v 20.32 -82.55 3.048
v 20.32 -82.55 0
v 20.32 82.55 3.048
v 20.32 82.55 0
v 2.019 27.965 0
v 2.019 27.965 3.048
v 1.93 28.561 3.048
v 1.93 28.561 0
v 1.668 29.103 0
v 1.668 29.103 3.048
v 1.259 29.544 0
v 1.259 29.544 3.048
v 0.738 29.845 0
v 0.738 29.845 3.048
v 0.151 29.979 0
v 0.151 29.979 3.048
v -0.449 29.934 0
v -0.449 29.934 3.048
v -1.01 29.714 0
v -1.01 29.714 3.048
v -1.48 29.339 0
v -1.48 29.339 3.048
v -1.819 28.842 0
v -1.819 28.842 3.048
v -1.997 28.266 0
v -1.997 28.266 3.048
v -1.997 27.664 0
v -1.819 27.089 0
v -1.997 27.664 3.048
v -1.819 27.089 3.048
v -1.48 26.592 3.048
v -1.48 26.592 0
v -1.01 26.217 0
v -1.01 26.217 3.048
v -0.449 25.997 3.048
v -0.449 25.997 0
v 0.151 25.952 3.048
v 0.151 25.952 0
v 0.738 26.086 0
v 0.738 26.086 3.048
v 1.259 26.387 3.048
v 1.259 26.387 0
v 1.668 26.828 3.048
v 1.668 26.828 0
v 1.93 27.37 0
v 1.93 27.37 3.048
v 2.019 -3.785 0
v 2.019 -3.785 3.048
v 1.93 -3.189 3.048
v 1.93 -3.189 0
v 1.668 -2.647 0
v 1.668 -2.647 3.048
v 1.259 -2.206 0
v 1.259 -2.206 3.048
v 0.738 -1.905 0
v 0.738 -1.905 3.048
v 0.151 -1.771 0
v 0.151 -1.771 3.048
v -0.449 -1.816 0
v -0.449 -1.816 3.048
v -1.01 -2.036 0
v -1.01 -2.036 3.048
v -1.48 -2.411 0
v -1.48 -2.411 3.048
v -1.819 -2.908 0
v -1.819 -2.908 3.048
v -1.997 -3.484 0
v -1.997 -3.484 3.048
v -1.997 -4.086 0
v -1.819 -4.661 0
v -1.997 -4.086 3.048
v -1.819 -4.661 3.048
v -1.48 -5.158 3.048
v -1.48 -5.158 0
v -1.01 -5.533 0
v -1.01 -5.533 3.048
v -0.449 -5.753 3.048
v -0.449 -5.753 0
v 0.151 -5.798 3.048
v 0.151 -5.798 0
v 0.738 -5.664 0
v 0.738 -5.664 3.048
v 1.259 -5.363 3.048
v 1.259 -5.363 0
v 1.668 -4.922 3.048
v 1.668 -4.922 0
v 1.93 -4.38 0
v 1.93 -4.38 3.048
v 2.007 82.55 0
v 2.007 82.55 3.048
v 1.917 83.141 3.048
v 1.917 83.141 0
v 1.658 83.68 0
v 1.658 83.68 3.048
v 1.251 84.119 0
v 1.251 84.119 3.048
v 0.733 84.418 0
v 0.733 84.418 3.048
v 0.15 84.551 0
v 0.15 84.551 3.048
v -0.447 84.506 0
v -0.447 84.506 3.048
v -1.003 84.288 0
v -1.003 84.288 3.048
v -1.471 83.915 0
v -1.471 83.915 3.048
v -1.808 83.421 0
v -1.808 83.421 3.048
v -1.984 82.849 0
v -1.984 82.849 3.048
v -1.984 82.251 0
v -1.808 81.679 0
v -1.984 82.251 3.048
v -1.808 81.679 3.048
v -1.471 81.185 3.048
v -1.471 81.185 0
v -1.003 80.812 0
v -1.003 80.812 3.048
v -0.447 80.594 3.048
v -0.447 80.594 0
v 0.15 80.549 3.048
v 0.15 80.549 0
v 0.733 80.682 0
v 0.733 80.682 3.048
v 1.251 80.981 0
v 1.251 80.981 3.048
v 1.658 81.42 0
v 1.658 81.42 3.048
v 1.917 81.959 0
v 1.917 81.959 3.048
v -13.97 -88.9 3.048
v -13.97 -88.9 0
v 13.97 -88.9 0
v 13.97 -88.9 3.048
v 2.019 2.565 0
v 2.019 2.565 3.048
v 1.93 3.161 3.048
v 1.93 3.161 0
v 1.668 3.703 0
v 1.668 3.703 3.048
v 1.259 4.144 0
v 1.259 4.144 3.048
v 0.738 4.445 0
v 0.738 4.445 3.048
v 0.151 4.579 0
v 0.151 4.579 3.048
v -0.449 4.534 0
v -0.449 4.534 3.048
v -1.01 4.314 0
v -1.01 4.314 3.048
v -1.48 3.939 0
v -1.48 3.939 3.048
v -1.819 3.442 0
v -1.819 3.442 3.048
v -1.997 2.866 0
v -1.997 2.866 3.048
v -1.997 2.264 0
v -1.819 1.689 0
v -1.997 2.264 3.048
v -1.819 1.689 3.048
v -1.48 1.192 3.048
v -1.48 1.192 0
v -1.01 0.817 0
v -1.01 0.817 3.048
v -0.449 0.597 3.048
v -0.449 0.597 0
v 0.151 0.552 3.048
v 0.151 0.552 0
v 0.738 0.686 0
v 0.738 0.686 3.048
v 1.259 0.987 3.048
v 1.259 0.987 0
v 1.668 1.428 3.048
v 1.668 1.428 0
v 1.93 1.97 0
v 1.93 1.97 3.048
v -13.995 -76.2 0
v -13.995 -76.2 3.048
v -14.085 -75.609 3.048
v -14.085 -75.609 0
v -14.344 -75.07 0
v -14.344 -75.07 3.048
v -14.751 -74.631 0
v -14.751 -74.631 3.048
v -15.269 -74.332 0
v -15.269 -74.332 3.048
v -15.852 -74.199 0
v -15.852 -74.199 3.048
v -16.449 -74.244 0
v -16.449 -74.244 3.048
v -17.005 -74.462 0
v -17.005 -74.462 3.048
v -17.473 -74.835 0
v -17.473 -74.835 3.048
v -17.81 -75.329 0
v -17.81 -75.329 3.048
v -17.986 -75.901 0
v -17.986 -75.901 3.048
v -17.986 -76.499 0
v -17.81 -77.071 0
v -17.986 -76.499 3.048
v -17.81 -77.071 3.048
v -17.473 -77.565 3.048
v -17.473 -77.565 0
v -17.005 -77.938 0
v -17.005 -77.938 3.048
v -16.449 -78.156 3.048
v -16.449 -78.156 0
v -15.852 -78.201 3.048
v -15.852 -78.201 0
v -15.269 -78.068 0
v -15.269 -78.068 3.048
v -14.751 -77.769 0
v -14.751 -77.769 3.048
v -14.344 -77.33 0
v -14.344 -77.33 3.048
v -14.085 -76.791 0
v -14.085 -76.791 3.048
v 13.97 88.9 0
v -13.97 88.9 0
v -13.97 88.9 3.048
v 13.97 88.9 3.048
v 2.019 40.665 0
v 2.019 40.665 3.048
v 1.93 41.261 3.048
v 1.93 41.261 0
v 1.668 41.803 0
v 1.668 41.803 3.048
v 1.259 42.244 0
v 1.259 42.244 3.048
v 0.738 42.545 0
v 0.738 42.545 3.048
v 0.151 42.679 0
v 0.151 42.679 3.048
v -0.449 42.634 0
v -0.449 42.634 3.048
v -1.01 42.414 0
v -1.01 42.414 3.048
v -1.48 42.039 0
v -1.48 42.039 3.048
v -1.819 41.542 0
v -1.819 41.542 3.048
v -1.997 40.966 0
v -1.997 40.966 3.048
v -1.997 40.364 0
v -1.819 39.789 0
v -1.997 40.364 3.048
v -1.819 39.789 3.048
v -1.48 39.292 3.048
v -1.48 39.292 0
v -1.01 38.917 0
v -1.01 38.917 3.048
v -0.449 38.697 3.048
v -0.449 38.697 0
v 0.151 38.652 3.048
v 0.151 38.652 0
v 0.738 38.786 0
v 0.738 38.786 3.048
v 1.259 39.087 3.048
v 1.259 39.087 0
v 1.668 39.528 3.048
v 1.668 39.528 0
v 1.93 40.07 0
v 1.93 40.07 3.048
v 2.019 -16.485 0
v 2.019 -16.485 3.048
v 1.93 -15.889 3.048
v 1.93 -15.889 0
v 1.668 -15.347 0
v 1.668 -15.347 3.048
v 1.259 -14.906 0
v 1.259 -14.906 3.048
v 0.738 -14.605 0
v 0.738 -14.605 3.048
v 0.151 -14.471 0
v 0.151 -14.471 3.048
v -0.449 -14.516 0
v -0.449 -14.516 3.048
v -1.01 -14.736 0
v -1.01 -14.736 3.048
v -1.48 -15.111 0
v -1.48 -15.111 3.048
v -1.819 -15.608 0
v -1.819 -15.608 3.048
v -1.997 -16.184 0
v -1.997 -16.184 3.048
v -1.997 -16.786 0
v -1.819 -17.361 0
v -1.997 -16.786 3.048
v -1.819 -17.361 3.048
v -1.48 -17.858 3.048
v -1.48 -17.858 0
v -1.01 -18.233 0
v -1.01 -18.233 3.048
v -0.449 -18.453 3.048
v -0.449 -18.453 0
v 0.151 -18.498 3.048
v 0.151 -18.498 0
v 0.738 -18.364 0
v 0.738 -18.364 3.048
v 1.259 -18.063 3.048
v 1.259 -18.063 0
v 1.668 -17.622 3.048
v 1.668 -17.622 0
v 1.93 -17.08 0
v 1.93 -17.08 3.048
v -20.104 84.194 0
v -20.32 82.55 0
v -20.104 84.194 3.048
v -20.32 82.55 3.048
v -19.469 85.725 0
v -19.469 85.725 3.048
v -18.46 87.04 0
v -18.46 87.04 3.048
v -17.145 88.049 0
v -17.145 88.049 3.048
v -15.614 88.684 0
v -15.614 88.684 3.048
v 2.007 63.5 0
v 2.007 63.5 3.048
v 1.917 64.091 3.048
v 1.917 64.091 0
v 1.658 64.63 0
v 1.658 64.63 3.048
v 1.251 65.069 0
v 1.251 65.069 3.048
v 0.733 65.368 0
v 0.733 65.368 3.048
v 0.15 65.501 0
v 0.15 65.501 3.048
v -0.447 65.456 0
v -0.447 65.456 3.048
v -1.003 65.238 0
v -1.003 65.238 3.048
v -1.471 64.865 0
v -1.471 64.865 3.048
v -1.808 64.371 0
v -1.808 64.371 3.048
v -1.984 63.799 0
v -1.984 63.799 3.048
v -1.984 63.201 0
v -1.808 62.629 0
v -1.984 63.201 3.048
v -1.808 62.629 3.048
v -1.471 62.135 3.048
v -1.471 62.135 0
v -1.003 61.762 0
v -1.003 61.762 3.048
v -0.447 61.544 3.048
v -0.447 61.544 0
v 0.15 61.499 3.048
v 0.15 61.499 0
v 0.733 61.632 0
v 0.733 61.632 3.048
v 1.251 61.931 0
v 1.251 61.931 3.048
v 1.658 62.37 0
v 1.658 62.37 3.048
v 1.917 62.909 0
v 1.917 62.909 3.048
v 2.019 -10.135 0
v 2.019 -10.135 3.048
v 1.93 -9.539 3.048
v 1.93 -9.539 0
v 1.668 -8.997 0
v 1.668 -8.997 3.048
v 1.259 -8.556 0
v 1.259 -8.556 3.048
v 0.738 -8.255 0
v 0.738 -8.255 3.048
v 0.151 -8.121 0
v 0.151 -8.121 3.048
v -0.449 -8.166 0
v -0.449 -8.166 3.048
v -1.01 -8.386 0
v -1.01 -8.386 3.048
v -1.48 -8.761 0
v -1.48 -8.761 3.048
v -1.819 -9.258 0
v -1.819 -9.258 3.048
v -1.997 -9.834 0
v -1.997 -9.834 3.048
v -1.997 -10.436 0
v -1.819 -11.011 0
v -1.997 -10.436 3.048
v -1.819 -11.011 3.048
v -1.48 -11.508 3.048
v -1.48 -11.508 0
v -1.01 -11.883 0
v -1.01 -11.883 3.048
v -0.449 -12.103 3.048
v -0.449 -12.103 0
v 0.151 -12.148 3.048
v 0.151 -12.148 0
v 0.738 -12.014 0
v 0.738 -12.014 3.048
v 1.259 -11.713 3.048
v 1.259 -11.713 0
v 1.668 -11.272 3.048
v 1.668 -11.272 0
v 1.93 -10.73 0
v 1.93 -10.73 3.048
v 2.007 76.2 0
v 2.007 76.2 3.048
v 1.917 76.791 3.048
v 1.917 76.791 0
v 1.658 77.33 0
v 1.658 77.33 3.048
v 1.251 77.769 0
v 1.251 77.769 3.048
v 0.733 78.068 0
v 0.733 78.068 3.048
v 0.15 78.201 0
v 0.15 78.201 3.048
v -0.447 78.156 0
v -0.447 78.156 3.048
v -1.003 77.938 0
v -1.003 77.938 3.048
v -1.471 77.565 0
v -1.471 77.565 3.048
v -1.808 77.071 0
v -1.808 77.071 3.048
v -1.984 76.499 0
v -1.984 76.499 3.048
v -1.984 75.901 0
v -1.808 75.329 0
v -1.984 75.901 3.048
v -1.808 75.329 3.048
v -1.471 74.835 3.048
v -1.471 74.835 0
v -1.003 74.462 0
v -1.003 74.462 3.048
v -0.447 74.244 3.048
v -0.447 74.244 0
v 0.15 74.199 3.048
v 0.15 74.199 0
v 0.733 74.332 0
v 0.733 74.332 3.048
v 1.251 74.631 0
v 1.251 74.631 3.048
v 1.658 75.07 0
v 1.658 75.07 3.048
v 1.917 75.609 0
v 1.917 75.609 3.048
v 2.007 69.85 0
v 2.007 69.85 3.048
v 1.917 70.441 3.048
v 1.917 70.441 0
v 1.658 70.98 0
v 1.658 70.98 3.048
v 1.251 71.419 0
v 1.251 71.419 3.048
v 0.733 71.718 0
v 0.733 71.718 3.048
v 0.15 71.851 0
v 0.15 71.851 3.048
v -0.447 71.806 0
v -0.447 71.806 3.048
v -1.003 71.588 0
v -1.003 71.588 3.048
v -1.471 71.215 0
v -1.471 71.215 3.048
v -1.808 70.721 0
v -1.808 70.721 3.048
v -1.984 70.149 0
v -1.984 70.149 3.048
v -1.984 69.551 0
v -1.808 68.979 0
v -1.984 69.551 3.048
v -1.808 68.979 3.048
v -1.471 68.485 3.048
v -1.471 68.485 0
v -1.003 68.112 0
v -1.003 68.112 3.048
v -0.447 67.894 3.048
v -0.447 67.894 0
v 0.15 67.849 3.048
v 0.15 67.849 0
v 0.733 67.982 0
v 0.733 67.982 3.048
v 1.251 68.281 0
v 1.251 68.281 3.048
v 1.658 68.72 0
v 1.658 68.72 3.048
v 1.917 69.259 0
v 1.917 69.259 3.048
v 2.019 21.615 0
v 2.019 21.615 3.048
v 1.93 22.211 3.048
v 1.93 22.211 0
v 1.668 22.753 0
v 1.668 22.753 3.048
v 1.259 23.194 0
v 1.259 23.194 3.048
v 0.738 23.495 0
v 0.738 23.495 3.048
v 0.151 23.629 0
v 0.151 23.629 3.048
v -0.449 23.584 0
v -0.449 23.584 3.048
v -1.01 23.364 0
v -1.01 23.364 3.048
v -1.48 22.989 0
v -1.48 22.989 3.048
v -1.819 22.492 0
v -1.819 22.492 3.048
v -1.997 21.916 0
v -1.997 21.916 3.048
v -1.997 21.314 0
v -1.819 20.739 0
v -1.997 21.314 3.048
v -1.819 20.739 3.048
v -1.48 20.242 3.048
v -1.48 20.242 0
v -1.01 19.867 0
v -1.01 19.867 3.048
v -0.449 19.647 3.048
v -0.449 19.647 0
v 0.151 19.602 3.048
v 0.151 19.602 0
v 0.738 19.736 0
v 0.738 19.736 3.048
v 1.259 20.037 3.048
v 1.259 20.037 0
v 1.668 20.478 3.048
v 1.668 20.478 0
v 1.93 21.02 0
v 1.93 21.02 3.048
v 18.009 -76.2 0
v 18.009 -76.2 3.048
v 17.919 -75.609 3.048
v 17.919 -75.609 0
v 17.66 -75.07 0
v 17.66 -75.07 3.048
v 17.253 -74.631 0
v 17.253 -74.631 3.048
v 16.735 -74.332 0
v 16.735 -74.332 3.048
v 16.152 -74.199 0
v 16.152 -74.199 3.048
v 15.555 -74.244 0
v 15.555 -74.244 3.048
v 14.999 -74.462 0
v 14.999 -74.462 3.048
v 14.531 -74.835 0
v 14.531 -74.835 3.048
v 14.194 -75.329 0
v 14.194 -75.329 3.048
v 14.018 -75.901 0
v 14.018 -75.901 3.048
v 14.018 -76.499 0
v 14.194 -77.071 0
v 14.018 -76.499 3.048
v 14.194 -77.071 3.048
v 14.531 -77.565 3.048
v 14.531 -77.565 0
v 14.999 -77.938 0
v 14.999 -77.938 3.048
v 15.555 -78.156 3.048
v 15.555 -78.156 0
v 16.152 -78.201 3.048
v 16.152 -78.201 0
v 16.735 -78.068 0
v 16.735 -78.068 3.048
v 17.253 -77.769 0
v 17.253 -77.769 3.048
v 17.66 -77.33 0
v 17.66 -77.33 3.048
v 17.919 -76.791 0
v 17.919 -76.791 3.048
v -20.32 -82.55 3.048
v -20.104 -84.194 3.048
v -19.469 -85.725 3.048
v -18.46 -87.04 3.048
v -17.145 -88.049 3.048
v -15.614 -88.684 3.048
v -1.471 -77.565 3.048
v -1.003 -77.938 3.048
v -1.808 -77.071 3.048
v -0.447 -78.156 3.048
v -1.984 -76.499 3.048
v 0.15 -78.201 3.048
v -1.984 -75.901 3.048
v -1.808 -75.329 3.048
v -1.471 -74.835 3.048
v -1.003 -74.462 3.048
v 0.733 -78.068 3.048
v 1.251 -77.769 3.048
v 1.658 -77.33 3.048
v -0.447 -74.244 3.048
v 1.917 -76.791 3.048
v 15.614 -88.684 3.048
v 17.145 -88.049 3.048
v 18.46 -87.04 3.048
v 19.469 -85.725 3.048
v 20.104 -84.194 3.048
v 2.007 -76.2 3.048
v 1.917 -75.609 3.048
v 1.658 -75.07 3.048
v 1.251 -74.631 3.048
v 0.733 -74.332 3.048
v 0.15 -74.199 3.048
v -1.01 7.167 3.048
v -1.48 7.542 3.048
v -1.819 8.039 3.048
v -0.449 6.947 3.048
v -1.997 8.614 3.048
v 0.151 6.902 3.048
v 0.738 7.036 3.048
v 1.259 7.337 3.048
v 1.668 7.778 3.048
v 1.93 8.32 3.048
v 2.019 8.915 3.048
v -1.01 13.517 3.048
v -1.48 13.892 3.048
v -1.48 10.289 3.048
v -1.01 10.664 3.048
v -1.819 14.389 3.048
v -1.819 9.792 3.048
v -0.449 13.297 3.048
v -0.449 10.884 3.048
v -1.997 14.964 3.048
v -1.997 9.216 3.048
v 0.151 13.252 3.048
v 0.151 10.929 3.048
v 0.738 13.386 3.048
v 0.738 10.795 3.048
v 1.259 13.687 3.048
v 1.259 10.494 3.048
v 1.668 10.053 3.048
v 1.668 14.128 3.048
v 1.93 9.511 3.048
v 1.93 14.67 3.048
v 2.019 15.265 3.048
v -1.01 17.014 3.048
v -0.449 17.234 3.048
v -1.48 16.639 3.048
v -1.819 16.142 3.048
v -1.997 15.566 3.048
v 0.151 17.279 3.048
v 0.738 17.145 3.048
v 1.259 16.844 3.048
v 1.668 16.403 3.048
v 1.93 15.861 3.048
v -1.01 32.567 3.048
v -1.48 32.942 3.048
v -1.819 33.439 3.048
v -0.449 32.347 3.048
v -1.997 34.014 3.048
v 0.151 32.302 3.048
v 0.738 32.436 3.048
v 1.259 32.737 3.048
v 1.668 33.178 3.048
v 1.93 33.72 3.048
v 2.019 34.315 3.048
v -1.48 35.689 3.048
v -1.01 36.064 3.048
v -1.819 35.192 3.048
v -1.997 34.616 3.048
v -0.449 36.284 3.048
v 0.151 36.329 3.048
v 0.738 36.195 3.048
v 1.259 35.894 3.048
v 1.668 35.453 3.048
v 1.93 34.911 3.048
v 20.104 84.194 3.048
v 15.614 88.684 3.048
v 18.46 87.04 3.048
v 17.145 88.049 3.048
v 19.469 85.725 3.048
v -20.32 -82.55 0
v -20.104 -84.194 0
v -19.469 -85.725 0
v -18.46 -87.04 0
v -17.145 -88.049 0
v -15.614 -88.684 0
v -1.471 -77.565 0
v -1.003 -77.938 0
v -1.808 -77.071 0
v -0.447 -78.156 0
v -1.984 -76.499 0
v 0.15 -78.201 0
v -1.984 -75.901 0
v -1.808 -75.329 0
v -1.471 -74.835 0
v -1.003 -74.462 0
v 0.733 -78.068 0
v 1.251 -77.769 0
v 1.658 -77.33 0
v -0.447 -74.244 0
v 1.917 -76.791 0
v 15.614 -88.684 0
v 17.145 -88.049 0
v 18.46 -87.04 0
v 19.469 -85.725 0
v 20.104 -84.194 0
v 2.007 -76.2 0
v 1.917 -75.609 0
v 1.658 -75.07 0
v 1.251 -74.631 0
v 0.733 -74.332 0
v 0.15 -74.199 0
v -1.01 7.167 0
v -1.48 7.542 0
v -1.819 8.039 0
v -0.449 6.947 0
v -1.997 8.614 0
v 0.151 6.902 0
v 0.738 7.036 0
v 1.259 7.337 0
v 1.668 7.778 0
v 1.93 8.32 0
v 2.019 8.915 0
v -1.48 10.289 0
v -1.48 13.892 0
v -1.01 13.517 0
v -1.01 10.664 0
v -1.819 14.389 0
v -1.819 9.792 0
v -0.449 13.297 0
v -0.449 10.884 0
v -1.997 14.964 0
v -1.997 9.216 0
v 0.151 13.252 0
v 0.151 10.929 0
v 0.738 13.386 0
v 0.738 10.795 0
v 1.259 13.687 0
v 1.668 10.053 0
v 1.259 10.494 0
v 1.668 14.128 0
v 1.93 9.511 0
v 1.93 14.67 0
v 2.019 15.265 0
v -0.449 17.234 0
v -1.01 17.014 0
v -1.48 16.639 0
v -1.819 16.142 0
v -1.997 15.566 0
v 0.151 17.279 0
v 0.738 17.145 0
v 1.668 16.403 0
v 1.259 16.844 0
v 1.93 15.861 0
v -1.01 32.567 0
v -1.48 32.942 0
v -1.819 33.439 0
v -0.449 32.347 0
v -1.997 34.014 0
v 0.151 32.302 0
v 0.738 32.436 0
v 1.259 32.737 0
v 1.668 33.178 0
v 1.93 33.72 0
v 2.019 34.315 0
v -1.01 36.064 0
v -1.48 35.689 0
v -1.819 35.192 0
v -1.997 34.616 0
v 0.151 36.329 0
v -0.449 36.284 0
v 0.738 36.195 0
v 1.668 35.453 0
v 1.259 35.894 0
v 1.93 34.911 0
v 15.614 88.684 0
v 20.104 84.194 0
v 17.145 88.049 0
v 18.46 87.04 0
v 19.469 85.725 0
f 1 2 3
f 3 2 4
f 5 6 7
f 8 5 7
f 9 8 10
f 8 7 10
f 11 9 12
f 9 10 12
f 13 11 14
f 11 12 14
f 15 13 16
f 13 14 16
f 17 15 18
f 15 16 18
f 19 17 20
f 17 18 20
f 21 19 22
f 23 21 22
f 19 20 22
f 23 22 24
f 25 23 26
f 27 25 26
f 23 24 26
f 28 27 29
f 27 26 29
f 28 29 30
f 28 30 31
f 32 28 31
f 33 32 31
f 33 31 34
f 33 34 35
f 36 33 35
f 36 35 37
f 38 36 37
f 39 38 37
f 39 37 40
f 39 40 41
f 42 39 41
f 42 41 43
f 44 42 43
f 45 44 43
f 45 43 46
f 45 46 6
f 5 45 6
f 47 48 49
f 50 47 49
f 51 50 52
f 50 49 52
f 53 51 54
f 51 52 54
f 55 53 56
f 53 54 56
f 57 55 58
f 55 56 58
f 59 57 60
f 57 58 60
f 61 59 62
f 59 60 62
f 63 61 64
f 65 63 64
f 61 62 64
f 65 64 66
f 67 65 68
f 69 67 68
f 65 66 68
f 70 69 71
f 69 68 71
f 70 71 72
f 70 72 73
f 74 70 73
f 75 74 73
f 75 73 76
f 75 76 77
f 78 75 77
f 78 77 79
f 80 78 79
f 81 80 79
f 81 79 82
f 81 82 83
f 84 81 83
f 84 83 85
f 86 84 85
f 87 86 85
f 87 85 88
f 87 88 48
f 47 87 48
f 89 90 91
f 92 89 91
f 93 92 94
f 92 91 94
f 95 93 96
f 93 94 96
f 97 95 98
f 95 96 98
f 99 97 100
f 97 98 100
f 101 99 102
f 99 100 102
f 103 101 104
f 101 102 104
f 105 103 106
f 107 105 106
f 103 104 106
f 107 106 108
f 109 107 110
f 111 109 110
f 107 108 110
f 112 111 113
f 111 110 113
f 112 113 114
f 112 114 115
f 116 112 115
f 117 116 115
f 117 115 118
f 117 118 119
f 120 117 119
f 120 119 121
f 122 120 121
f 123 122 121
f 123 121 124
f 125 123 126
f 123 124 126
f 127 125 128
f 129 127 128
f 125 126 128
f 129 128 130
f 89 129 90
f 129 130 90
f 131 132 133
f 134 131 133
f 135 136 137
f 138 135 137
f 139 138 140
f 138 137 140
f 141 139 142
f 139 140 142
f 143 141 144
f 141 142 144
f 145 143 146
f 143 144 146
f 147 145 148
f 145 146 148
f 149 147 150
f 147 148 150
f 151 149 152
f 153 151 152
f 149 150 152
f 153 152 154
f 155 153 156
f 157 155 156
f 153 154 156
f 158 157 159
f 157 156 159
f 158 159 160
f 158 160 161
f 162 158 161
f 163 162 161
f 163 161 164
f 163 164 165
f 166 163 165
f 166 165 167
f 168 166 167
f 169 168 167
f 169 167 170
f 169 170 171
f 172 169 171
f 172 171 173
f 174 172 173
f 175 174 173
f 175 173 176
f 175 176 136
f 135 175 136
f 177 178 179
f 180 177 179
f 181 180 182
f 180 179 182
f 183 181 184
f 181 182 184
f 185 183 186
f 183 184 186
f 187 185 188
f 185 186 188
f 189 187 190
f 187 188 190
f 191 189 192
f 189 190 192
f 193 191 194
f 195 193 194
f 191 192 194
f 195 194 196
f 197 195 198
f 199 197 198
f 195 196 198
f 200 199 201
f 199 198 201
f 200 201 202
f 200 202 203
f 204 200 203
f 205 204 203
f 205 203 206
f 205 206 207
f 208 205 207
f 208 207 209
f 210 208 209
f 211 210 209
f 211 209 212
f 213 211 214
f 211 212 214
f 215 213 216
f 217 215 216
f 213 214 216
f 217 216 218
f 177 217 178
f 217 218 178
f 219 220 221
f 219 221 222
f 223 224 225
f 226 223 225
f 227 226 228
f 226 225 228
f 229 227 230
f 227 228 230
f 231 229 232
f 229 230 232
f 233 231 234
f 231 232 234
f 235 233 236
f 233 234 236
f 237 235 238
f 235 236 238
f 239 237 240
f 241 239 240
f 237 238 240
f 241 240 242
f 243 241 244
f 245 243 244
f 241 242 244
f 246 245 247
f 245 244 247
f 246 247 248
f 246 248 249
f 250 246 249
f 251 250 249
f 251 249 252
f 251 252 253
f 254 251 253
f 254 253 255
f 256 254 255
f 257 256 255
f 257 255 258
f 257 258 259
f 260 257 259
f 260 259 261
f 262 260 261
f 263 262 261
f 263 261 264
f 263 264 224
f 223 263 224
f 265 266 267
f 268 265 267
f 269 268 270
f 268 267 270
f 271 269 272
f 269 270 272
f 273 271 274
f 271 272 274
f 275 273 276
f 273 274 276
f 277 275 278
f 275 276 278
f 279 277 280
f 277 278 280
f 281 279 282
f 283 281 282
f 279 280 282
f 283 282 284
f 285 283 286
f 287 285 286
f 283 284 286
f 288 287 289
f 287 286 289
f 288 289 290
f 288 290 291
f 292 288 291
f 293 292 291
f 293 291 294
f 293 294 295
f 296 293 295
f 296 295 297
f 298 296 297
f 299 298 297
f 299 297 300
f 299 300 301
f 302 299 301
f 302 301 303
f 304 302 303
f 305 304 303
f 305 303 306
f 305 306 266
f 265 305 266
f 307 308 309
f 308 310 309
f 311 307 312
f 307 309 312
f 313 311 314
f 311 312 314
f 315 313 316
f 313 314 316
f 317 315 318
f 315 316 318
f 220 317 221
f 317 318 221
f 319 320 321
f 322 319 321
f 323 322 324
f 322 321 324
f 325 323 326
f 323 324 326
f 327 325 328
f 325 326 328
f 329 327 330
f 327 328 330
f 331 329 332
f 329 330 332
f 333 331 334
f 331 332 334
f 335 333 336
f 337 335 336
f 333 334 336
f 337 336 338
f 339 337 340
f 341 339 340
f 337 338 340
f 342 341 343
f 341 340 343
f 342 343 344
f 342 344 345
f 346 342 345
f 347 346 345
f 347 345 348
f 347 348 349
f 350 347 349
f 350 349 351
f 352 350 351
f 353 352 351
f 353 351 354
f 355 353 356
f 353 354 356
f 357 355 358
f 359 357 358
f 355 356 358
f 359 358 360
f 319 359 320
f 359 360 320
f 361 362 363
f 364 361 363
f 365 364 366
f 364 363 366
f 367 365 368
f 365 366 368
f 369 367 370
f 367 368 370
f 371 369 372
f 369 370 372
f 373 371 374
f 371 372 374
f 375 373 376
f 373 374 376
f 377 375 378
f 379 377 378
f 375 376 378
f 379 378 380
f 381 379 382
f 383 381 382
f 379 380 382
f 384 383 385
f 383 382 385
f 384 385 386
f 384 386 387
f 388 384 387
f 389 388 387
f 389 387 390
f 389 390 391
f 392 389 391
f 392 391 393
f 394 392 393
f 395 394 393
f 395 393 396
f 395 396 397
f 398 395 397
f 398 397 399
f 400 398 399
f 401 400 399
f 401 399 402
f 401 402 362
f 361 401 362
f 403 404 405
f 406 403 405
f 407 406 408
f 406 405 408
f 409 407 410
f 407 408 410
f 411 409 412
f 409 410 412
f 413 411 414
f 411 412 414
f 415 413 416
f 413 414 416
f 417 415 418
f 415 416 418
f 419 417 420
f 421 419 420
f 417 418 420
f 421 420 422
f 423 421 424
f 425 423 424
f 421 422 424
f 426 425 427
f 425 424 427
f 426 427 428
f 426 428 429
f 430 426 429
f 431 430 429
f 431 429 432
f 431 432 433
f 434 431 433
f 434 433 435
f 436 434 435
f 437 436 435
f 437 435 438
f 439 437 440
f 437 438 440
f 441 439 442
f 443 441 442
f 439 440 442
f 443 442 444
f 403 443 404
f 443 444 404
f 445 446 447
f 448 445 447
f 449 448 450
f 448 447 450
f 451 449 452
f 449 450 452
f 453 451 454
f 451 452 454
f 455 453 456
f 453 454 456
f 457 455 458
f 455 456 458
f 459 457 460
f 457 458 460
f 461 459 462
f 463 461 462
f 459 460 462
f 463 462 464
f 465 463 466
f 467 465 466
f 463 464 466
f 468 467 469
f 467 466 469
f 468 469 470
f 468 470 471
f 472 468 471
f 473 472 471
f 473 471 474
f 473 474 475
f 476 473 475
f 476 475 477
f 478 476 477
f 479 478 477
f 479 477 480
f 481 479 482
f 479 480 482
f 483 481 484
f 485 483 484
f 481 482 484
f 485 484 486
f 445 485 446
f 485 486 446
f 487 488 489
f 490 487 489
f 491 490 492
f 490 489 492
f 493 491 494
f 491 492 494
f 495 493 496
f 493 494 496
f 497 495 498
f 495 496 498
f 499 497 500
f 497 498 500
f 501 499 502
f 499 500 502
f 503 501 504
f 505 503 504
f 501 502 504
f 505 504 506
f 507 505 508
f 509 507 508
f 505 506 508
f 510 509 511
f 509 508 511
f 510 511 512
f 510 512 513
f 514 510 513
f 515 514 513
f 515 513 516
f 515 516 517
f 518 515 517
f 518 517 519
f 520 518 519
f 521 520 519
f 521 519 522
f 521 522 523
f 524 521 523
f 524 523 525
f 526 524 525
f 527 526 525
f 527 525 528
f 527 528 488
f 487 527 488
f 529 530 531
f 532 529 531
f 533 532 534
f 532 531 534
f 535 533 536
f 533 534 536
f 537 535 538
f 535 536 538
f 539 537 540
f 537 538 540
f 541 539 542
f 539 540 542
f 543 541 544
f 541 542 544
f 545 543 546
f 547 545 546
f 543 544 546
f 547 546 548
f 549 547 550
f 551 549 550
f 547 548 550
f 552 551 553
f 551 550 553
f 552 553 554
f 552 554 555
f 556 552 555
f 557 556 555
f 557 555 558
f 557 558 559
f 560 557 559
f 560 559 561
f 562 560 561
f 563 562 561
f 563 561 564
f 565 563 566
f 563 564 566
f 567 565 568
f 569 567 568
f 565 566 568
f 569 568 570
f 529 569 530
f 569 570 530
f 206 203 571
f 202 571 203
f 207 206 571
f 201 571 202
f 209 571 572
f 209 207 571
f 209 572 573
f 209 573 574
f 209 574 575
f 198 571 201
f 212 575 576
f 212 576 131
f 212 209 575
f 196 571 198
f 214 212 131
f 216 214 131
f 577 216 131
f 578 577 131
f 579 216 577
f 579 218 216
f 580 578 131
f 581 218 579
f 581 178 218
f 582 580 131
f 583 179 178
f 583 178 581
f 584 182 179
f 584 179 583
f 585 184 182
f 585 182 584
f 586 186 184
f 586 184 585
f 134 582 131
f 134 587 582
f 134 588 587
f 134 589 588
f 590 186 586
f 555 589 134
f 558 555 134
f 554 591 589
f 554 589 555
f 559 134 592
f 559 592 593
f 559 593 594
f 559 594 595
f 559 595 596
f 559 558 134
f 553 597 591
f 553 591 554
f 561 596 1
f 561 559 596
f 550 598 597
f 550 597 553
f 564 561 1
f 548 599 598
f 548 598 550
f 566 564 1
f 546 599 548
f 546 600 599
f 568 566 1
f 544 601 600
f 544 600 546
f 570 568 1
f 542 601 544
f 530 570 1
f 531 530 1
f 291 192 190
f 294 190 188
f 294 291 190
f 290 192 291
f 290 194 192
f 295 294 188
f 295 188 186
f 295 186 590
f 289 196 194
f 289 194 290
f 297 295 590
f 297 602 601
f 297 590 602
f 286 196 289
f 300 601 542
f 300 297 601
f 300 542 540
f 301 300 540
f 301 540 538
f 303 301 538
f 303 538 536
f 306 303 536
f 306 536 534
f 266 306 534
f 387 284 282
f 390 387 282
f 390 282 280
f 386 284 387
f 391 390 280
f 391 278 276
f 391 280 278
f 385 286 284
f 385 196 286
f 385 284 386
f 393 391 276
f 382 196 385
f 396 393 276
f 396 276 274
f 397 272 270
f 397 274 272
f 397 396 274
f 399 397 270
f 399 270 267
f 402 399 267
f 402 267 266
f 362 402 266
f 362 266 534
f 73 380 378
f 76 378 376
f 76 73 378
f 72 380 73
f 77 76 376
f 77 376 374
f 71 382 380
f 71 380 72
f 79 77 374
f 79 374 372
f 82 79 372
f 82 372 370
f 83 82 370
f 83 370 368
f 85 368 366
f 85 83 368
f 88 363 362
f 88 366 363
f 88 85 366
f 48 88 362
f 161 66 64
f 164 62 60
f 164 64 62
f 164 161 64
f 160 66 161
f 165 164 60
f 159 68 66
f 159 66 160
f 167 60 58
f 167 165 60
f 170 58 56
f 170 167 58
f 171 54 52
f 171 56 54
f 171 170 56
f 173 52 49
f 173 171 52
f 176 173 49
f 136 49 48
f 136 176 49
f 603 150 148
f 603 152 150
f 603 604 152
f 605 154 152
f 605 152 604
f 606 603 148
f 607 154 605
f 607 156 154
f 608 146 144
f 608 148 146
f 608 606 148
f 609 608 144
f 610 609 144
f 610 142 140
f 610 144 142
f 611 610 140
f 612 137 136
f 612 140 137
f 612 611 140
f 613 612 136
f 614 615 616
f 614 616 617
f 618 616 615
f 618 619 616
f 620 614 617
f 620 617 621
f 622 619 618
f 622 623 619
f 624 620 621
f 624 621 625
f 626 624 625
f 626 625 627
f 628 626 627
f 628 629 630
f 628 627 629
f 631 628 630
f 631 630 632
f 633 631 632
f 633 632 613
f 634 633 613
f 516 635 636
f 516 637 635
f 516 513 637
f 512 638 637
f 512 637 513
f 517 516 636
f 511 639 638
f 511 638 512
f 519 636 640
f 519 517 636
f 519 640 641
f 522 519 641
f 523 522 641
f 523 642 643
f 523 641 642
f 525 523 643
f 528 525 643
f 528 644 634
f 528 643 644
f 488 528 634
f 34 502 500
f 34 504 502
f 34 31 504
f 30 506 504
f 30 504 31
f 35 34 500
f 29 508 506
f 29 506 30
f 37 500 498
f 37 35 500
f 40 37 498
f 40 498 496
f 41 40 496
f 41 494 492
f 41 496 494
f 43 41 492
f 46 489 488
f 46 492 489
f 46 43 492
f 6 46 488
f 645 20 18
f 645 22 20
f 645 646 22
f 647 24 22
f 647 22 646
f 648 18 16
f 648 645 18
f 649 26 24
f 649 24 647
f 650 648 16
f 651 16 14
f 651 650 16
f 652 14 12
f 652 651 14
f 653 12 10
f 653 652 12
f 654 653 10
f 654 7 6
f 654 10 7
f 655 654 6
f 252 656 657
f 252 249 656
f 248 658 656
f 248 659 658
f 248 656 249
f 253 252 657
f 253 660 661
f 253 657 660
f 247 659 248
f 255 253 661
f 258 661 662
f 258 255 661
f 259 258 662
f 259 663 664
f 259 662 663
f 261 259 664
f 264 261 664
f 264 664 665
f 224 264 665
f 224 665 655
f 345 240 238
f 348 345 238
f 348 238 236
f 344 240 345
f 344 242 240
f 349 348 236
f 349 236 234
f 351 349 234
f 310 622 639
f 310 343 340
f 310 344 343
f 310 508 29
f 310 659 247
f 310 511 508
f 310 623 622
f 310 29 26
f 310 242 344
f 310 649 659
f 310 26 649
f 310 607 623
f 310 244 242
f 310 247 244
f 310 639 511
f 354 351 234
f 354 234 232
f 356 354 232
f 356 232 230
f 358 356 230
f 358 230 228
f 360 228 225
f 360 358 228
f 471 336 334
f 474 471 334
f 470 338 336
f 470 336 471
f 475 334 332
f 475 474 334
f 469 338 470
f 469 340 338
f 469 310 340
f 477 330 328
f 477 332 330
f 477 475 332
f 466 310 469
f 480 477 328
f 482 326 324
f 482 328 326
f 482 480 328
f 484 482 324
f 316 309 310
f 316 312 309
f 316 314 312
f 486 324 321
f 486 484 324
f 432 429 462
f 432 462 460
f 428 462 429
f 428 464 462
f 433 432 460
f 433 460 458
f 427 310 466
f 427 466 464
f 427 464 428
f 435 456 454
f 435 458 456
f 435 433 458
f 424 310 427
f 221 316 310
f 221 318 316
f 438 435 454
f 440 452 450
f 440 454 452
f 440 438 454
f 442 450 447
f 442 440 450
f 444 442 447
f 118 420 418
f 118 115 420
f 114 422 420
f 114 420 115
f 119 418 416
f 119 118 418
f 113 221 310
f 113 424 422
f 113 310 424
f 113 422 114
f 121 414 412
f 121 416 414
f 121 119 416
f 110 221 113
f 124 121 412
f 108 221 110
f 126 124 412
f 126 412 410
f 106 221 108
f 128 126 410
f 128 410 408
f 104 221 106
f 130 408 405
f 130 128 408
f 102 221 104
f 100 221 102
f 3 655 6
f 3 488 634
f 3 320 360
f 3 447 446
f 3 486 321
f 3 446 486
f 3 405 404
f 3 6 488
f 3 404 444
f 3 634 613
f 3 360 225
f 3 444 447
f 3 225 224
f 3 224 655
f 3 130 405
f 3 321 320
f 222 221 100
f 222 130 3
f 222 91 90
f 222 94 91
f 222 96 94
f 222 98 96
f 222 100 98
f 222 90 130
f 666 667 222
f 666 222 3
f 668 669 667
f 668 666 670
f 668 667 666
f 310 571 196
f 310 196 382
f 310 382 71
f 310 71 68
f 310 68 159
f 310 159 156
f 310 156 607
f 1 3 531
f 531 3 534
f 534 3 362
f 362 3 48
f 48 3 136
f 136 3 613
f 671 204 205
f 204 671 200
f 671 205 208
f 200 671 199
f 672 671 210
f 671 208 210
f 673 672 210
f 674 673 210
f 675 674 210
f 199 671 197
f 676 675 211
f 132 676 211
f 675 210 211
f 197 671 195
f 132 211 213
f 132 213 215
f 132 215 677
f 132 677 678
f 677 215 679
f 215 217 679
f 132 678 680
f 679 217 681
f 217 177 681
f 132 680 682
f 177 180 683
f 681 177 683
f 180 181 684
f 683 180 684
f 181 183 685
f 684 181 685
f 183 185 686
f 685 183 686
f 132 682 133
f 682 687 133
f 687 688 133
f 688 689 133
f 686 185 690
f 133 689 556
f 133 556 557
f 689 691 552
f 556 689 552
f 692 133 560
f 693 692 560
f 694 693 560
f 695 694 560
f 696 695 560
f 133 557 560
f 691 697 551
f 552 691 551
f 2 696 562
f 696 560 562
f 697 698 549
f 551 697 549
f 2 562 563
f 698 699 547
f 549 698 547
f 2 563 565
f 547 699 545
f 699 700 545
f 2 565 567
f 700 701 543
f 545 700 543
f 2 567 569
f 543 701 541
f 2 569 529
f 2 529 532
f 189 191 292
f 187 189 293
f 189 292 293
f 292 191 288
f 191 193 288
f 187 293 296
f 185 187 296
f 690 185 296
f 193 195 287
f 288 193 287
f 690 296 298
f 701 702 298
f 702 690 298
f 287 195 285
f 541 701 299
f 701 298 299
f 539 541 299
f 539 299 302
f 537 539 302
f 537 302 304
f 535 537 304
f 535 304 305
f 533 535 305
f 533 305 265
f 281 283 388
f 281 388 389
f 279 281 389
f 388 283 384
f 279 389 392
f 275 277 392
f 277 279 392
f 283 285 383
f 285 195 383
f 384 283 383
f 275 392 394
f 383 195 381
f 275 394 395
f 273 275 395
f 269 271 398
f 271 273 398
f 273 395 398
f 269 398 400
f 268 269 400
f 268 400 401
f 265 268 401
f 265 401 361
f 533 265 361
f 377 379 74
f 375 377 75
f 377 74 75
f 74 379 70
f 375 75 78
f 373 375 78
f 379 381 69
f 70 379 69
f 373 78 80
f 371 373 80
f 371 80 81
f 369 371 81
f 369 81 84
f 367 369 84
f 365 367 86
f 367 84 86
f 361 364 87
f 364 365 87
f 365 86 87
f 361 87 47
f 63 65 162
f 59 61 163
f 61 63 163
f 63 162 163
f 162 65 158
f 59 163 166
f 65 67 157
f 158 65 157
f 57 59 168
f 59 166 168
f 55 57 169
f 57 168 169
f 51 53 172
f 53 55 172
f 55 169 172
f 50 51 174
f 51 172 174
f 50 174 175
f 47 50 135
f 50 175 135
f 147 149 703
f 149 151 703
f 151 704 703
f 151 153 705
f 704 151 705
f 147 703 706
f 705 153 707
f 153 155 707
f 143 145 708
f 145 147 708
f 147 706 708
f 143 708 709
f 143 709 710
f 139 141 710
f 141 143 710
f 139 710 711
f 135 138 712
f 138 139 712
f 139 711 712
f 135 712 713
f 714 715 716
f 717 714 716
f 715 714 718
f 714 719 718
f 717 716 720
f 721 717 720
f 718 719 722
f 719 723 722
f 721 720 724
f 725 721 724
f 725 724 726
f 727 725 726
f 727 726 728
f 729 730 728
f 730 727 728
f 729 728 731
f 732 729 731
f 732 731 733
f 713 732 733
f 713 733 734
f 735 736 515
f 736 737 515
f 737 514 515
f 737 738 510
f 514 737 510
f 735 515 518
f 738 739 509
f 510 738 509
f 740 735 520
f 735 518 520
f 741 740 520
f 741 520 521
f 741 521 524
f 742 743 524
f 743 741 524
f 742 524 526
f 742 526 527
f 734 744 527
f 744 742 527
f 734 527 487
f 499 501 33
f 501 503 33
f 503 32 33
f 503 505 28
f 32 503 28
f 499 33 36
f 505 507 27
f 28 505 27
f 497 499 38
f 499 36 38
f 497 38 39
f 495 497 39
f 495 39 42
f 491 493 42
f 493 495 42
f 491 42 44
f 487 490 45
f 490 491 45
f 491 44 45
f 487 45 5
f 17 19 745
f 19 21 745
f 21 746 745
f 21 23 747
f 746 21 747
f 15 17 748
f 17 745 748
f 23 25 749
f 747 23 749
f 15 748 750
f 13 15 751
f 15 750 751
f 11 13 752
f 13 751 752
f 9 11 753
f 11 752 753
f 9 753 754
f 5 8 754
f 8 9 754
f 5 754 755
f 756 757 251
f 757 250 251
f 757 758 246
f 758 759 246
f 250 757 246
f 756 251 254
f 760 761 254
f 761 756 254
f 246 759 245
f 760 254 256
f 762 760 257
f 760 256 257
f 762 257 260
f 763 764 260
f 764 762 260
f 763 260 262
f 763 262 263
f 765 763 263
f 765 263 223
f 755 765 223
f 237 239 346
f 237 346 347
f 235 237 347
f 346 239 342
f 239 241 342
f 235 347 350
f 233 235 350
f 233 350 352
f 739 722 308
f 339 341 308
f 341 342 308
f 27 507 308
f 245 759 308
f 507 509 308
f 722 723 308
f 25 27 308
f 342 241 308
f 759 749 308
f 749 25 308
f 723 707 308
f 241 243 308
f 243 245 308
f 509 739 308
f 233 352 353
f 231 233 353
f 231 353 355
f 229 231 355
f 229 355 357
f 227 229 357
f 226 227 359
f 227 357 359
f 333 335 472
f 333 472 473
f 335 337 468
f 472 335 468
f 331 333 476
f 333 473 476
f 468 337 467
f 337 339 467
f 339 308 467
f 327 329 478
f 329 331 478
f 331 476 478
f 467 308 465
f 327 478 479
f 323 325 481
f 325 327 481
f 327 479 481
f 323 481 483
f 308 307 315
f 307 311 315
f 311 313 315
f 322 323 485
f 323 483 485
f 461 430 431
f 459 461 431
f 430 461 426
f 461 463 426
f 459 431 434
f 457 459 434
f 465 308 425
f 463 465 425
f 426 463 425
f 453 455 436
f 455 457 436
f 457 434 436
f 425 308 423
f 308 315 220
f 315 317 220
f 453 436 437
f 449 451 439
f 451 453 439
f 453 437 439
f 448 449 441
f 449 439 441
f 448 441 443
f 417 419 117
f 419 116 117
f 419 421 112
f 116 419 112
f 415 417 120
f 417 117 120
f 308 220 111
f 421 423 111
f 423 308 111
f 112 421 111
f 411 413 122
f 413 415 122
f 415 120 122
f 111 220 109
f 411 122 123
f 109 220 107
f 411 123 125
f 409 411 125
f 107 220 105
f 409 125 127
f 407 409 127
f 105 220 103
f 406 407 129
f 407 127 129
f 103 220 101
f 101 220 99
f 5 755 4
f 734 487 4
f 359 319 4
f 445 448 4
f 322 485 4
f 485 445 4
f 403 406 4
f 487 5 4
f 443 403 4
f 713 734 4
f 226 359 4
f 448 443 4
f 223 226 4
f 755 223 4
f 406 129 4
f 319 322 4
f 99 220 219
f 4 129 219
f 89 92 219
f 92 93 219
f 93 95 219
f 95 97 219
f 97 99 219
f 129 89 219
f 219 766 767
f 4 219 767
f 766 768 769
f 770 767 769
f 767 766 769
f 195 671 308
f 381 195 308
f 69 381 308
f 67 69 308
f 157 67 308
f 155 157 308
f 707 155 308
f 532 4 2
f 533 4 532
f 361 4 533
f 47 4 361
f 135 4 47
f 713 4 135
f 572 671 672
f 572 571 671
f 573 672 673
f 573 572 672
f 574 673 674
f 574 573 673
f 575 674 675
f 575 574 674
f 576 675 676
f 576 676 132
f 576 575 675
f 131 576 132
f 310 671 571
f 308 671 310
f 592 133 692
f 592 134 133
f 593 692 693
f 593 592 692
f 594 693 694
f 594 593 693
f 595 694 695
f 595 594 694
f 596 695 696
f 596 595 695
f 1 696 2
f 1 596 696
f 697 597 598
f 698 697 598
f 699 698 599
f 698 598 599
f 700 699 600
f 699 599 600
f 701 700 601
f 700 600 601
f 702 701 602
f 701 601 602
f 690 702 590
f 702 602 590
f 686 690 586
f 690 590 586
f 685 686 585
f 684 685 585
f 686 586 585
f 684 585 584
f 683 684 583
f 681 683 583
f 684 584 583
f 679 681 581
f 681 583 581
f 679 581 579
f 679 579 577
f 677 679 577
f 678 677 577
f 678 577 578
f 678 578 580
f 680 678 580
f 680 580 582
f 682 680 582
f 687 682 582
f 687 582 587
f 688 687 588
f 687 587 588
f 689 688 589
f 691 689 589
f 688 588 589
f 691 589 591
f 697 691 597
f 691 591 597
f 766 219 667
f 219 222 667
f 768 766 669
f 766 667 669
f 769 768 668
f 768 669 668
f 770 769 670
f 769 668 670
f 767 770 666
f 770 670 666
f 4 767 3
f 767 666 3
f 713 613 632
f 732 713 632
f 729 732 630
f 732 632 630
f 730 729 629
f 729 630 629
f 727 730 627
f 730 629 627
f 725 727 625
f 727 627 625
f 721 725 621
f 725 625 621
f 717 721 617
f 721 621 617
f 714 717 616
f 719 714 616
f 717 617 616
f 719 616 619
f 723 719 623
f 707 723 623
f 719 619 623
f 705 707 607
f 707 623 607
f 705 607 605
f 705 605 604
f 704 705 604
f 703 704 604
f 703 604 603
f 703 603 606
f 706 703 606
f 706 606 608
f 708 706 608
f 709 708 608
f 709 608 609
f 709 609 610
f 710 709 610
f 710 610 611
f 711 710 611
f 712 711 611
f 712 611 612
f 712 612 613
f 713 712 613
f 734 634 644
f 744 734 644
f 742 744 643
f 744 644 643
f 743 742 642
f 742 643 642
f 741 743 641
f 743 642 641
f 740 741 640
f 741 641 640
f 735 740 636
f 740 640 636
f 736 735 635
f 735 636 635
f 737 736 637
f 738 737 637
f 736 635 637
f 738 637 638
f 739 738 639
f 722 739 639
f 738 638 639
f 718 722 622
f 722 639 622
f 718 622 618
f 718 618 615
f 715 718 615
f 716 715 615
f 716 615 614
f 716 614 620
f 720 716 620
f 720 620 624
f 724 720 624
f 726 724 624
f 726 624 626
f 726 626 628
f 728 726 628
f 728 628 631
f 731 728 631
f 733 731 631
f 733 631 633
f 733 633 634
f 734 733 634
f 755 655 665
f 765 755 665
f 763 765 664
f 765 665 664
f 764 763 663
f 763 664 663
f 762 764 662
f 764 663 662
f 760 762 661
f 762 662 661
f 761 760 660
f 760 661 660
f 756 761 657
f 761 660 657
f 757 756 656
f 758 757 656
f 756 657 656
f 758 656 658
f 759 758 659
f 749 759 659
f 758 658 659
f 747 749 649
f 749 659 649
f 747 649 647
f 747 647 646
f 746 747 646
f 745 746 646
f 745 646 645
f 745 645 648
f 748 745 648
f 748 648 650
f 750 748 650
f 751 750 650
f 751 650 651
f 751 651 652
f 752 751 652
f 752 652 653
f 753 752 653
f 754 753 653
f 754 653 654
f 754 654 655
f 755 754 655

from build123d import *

# Parameters (mm, degrees)
SKETCH1_W           = 40.64
SKETCH1_H           = 177.8
BOSS_EXTRUDE1_DEPTH = 3.048
SKETCH2_R           = 2.0066
CUT_EXTRUDE1_DEPTH  = 3.048
SKETCH3_R           = 2.0193
CUT_EXTRUDE2_DEPTH  = 92.243644732
FILLET1_R           = 6.35


with BuildPart() as part:
    # Sketch1 → Boss-Extrude1 (new body)
    with BuildSketch(Plane.XY):
        Rectangle(SKETCH1_W, SKETCH1_H)
    extrude(amount=BOSS_EXTRUDE1_DEPTH)

    # Sketch2 → Cut-Extrude1 (cut)
    with BuildSketch(Plane.XY.offset(3.048)):
        with Locations((0, -76.2)):
            Circle(SKETCH2_R)
        with Locations((0, 82.55)):
            Circle(SKETCH2_R)
        with Locations((0, 76.2)):
            Circle(SKETCH2_R)
        with Locations((0, 69.85)):
            Circle(SKETCH2_R)
        with Locations((0, 63.5)):
            Circle(SKETCH2_R)
        with Locations((16.002, -76.2)):
            Circle(SKETCH2_R)
        with Locations((-16.002, -76.2)):
            Circle(SKETCH2_R)
    extrude(amount=-CUT_EXTRUDE1_DEPTH, mode=Mode.SUBTRACT)

    # Sketch3 → Cut-Extrude2 (cut, through all)
    with BuildSketch(Plane.XY.offset(3.048)):
        with Locations((0, -16.4846)):
            Circle(SKETCH3_R)
        with Locations((0, -10.1346)):
            Circle(SKETCH3_R)
        with Locations((0, -3.7846)):
            Circle(SKETCH3_R)
        with Locations((0, 2.5654)):
            Circle(SKETCH3_R)
        with Locations((0, 8.9154)):
            Circle(SKETCH3_R)
        with Locations((0, 15.2654)):
            Circle(SKETCH3_R)
        with Locations((0, 21.6154)):
            Circle(SKETCH3_R)
        with Locations((0, 27.9654)):
            Circle(SKETCH3_R)
        with Locations((0, 34.3154)):
            Circle(SKETCH3_R)
        with Locations((0, 40.6654)):
            Circle(SKETCH3_R)
    extrude(amount=-CUT_EXTRUDE2_DEPTH, mode=Mode.SUBTRACT)

    # Fillet1
    fillet1_edges = [part.edges().sort_by_distance(p)[0] for p in [
        (20.32, -88.9, 1.524),
        (-20.32, -88.9, 1.524),
        (-20.32, 88.9, 1.524),
        (20.32, 88.9, 1.524),
    ]]
    fillet(fillet1_edges, radius=FILLET1_R)


solid = part.part
